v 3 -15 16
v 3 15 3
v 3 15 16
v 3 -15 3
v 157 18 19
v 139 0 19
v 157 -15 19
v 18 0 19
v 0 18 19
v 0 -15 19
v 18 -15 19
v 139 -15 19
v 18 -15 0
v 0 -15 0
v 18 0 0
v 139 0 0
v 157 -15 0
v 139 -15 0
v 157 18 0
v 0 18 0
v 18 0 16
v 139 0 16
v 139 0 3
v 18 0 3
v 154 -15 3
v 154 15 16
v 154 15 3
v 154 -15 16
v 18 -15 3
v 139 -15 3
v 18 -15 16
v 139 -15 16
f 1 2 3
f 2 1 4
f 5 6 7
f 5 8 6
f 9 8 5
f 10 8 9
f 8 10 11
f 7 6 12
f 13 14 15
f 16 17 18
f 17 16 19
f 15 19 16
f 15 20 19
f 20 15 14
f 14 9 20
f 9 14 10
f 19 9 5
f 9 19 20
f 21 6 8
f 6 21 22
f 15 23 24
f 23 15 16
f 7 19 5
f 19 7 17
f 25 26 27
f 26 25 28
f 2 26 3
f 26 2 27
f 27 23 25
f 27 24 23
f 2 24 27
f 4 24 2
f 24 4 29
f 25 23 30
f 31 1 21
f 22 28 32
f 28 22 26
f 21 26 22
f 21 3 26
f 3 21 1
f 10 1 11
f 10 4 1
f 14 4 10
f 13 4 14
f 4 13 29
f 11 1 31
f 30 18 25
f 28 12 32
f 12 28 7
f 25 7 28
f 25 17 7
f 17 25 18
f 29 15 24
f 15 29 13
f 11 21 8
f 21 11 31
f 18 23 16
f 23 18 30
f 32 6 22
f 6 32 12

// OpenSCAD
//Este codigo es como hacer un clip que se ajusta automaticamente a un acrilico de un espesor z, un largo x a una profunidad y.Generalmente usamos el espesor del acrilico mas 1mm (grosor papel). Ademas se puede prolongar hasta una determinado extra para mayor presion. Con paredes de espesor de 3.
//input
//Medidas acrilico
eAc = 6; //espesor del acrilico
aAc = 151; //ancho del acrilico
//Medidas impresion 3D
gp3D = 3; // grosor de la pared impresa en 3D
c3D = 15; //cobertura del plastico que esta superpuesto al acrilico
//Medidas extensiones, son utiles para aumentar la superficie de contacto que alica presion sobre el extremo del acrilico.
pEx = 15; //protrusion de la extension desde el final del cuerpo mayor, cuando sale la extension. Suele ser similar al c3D.
aEx = 15; //ancho de la protusion del cuerpo mayor. Suele ser similar al c3D.
//Medidas papel
ePa = 1; //espesor del papel. Considerado para la presion que hara el clip sobre este. Suele ser consierado como 1mm.

//output
//Medidas del clip
xPl = gp3D; // componente de la pared lateral en el eje x.
yPl = gp3D + c3D; // componente de la pared lateral en el eje y.
zPl = 2*eAc + 2*gp3D + ePa; // componente de la pared lateral en el eje z.
xPp = aAc + 2*gp3D; // componente de la pared posterior en el eje x.
yPp = gp3D; // componente de la pared posterior en el eje y.
zPp = zPl; // componente de la pared posterior en el eje z.
xPs = xPp; // componente de la pared superior en el eje x.
yPs = yPl; // componente de la pared superior en el eje y.
zPs = gp3D; // componente de la pared superior en el eje z.

//Paredes laterales vistas de frente.
cube([xPl,yPl,zPl]);
translate([(gp3D+aAc),0,0]) 
    cube([xPl,yPl,zPl]);

//Pared posterior
translate([0,(c3D),0]) 
    cube([xPp,yPp,zPp]);
    
//Paredes superior e inferior vistas de frente.
cube([xPs,yPs,zPs]);
translate([0,0,(zPl-gp3D)]) 
    cube([xPs,yPs,zPs]);  
  
//Extensiones
//Paredes laterales de las extenciones.
translate([0,-pEx,0]) //se traslada en y el valor negativo de su protrusion.
    cube([xPl,pEx,zPl]);
translate([(gp3D+aAc),-pEx,0]) // se traslada en x lo mismo que la pared lateral.
    cube([xPl,pEx,zPl]);

//Paredes superiores de las extenciones
translate([0,-pEx,0]) //se traslada en y el valor negativo de su protrusion.
    cube([(aEx + gp3D),pEx,gp3D]);
translate([0,-pEx,(zPl-gp3D)])
    cube([(aEx + gp3D),pEx,gp3D]);
translate([(aAc + gp3D - aEx),-pEx,0])
    cube([(aEx + gp3D),pEx,gp3D]);
translate([(aAc + gp3D - aEx),-pEx,(zPl-gp3D)])
    cube([(aEx + gp3D),pEx,gp3D]);

//testercube
//cube([30,16,30]);
